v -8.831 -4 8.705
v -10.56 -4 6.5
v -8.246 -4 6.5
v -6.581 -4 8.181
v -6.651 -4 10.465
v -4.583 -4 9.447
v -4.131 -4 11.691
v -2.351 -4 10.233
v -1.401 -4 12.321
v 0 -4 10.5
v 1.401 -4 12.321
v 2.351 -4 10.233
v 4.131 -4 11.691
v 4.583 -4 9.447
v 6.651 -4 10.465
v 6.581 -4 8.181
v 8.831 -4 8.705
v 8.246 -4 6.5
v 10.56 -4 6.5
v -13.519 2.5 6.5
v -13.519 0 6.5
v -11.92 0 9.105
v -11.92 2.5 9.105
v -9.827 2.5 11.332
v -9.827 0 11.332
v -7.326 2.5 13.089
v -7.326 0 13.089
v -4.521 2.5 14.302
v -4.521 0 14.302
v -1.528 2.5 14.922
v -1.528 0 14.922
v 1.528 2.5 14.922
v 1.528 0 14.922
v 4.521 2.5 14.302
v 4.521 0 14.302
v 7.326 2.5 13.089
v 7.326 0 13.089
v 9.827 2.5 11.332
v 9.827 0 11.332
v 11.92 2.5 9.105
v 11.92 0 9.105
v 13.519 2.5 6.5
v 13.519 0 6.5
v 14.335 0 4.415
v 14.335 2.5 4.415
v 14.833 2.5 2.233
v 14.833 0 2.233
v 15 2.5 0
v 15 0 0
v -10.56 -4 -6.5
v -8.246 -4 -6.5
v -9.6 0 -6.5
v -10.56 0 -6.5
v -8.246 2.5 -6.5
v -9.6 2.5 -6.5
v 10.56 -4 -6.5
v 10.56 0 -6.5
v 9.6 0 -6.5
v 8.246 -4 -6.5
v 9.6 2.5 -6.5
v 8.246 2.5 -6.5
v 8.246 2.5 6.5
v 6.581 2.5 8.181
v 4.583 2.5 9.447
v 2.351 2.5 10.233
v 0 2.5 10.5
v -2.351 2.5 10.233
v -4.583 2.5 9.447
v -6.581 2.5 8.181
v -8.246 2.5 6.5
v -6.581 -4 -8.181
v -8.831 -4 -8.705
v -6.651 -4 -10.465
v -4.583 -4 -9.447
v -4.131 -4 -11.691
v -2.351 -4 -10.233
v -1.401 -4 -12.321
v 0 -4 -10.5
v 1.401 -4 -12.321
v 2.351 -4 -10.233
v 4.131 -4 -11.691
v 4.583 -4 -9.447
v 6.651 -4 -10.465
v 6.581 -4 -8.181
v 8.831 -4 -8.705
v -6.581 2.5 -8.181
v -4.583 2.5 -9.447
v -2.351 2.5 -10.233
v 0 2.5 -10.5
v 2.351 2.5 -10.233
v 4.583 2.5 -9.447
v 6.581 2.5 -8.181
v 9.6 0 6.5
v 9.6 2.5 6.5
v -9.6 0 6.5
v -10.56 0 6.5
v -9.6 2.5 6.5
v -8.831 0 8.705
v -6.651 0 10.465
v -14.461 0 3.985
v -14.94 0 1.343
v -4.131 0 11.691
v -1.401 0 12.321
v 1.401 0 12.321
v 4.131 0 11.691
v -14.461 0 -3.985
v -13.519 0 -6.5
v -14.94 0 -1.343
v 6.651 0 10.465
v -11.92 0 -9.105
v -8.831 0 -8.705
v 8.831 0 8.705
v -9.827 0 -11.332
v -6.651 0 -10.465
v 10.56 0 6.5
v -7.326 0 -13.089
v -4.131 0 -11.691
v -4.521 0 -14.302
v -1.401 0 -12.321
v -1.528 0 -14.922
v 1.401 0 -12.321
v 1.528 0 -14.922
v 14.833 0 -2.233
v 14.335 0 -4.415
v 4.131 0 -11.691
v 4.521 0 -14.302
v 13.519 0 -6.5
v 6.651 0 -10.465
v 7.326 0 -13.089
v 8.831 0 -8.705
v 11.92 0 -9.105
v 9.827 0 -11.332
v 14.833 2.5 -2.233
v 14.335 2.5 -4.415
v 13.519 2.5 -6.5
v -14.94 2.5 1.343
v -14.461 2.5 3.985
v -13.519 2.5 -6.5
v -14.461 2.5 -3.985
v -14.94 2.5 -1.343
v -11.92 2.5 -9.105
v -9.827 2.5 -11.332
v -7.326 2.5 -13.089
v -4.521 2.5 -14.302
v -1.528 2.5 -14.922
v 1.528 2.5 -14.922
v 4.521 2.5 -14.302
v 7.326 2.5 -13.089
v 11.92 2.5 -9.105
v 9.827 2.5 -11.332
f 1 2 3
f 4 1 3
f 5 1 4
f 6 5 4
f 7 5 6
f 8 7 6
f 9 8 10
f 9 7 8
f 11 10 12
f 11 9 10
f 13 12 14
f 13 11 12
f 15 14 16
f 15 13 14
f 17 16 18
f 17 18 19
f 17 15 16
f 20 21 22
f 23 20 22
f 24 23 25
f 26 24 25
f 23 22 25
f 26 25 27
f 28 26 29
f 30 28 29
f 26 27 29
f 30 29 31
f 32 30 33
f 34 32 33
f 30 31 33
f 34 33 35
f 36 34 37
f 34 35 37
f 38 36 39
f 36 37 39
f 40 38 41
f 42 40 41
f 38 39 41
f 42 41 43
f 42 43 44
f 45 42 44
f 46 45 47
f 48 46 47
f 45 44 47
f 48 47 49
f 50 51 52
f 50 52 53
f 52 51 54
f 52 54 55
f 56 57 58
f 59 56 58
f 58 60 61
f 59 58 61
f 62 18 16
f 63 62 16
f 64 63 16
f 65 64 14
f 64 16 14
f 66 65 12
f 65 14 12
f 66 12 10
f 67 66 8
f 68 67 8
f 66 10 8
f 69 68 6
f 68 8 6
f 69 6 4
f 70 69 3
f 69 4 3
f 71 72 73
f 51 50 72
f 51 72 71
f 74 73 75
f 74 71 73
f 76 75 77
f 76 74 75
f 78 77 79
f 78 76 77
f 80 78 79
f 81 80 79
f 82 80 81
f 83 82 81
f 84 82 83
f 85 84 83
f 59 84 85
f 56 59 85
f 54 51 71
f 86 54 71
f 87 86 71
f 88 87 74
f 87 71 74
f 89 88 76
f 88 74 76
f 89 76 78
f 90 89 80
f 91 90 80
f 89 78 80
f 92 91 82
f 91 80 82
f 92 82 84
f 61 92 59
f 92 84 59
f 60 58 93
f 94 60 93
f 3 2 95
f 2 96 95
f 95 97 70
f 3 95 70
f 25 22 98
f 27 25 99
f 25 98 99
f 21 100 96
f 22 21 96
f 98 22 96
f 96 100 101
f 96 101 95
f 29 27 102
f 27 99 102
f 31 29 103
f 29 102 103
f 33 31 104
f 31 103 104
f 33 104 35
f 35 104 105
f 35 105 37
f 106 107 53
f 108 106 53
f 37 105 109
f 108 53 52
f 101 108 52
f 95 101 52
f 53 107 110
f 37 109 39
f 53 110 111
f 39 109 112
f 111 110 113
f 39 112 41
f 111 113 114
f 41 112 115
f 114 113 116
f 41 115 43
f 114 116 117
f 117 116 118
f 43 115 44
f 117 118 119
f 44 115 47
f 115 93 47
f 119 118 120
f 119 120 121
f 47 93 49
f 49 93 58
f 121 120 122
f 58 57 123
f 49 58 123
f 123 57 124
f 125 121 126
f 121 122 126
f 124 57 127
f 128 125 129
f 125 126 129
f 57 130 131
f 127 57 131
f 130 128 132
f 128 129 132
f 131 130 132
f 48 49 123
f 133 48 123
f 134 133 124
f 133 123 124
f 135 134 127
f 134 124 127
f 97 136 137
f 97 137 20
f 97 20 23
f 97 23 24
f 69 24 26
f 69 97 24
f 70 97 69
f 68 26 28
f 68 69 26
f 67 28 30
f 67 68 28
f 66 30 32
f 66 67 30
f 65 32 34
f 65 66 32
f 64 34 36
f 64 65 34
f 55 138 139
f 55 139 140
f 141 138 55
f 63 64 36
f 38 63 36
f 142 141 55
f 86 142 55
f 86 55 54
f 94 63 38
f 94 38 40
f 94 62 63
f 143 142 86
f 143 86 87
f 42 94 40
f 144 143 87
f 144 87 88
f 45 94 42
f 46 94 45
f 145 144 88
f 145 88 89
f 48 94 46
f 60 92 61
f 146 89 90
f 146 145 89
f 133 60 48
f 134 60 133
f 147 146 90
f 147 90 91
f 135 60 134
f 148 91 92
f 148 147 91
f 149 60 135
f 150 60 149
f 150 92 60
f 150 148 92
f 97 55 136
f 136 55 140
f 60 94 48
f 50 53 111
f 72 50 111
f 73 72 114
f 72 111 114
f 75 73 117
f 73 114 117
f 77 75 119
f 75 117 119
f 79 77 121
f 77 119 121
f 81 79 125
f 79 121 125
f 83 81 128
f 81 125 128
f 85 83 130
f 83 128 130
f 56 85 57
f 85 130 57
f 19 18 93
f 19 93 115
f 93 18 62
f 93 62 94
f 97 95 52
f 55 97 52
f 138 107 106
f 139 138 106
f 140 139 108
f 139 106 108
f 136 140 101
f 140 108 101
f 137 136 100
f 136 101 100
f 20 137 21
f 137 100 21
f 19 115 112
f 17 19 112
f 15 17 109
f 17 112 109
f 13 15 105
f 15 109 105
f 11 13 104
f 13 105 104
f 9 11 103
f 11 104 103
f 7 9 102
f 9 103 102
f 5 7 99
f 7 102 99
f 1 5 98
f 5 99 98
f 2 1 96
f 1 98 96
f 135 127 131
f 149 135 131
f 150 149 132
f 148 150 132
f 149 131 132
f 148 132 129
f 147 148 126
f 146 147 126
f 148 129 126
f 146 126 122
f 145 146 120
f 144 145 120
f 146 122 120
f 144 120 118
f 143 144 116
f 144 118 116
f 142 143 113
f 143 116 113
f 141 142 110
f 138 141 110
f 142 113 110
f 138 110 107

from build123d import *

# Parameters (mm, degrees)
BOSS_EXTRUDE1_DEPTH     = 2.5
BOSS_EXTRUDE2_DEPTH     = 4
CUT_EXTRUDE1_DEPTH      = 5
CUT_EXTRUDE1_DEPTH_BACK = 3.5


with BuildPart() as part:
    # Sketch1 → Boss-Extrude1 (new body)
    with BuildSketch(Plane(origin=(0, 0, 0), x_dir=(1, 0, 0), z_dir=(0, 1, 0))):
        with BuildLine():
            Line((-9.6, -6.5), (-9.6, 6.5))
            Line((-9.6, 6.5), (-13.518505835, 6.5))
            ThreePointArc((-13.518505835, 6.5), (-15, 0), (-13.518505835, -6.5))
            Line((-13.518505835, -6.5), (-9.6, -6.5))
        make_face()
        with BuildLine():
            Line((9.6, -6.5), (-9.6, -6.5))
            Line((-9.6, -6.5), (-13.518505835, -6.5))
            ThreePointArc((-13.518505835, -6.5), (0, -15), (13.518505835, -6.5))
            Line((13.518505835, -6.5), (9.6, -6.5))
        make_face()
        with BuildLine():
            Line((-13.518505835, 6.5), (-9.6, 6.5))
            Line((-9.6, 6.5), (9.6, 6.5))
            Line((9.6, 6.5), (13.518505835, 6.5))
            ThreePointArc((13.518505835, 6.5), (0, 15), (-13.518505835, 6.5))
        make_face()
        with BuildLine():
            Line((13.518505835, 6.5), (9.6, 6.5))
            Line((9.6, 6.5), (9.6, -6.5))
            Line((9.6, -6.5), (13.518505835, -6.5))
            ThreePointArc((13.518505835, -6.5), (14.624937393, -3.333347603), (15, 0))
            ThreePointArc((15, 0), (14.624937393, 3.333347603), (13.518505835, 6.5))
        make_face()
    extrude(amount=BOSS_EXTRUDE1_DEPTH)

    # Sketch2 → Boss-Extrude2 (add)
    with BuildSketch(Plane.XZ):
        with BuildLine():
            ThreePointArc((10.559829544, 6.5), (0, 12.4), (-10.559829544, 6.5))
            Line((-10.559829544, 6.5), (-9.6, 6.5))
            Line((-9.6, 6.5), (-8.246211251, 6.5))
            ThreePointArc((-8.246211251, 6.5), (0, 10.5), (8.246211251, 6.5))
            Line((8.246211251, 6.5), (9.6, 6.5))
            Line((9.6, 6.5), (10.559829544, 6.5))
        make_face()
        with BuildLine():
            Line((-9.6, -6.5), (-10.559829544, -6.5))
            ThreePointArc((-10.559829544, -6.5), (0, -12.4), (10.559829544, -6.5))
            Line((10.559829544, -6.5), (9.6, -6.5))
            Line((9.6, -6.5), (8.246211251, -6.5))
            ThreePointArc((8.246211251, -6.5), (0, -10.5), (-8.246211251, -6.5))
            Line((-8.246211251, -6.5), (-9.6, -6.5))
        make_face()
    extrude(amount=BOSS_EXTRUDE2_DEPTH)

    # Sketch2<3> → Cut-Extrude1 (cut, two sides)
    with BuildSketch(Plane.XZ) as cut_extrude1_sk:
        with BuildLine():
            ThreePointArc((8.246211251, 6.5), (0, 10.5), (-8.246211251, 6.5))
            Line((-8.246211251, 6.5), (8.246211251, 6.5))
        make_face()
        with BuildLine():
            Line((8.246211251, -6.5), (-8.246211251, -6.5))
            ThreePointArc((-8.246211251, -6.5), (0, -10.5), (8.246211251, -6.5))
        make_face()
    extrude(amount=CUT_EXTRUDE1_DEPTH, mode=Mode.SUBTRACT)
    extrude(cut_extrude1_sk.sketch, amount=-CUT_EXTRUDE1_DEPTH_BACK, mode=Mode.SUBTRACT)


solid = part.part
